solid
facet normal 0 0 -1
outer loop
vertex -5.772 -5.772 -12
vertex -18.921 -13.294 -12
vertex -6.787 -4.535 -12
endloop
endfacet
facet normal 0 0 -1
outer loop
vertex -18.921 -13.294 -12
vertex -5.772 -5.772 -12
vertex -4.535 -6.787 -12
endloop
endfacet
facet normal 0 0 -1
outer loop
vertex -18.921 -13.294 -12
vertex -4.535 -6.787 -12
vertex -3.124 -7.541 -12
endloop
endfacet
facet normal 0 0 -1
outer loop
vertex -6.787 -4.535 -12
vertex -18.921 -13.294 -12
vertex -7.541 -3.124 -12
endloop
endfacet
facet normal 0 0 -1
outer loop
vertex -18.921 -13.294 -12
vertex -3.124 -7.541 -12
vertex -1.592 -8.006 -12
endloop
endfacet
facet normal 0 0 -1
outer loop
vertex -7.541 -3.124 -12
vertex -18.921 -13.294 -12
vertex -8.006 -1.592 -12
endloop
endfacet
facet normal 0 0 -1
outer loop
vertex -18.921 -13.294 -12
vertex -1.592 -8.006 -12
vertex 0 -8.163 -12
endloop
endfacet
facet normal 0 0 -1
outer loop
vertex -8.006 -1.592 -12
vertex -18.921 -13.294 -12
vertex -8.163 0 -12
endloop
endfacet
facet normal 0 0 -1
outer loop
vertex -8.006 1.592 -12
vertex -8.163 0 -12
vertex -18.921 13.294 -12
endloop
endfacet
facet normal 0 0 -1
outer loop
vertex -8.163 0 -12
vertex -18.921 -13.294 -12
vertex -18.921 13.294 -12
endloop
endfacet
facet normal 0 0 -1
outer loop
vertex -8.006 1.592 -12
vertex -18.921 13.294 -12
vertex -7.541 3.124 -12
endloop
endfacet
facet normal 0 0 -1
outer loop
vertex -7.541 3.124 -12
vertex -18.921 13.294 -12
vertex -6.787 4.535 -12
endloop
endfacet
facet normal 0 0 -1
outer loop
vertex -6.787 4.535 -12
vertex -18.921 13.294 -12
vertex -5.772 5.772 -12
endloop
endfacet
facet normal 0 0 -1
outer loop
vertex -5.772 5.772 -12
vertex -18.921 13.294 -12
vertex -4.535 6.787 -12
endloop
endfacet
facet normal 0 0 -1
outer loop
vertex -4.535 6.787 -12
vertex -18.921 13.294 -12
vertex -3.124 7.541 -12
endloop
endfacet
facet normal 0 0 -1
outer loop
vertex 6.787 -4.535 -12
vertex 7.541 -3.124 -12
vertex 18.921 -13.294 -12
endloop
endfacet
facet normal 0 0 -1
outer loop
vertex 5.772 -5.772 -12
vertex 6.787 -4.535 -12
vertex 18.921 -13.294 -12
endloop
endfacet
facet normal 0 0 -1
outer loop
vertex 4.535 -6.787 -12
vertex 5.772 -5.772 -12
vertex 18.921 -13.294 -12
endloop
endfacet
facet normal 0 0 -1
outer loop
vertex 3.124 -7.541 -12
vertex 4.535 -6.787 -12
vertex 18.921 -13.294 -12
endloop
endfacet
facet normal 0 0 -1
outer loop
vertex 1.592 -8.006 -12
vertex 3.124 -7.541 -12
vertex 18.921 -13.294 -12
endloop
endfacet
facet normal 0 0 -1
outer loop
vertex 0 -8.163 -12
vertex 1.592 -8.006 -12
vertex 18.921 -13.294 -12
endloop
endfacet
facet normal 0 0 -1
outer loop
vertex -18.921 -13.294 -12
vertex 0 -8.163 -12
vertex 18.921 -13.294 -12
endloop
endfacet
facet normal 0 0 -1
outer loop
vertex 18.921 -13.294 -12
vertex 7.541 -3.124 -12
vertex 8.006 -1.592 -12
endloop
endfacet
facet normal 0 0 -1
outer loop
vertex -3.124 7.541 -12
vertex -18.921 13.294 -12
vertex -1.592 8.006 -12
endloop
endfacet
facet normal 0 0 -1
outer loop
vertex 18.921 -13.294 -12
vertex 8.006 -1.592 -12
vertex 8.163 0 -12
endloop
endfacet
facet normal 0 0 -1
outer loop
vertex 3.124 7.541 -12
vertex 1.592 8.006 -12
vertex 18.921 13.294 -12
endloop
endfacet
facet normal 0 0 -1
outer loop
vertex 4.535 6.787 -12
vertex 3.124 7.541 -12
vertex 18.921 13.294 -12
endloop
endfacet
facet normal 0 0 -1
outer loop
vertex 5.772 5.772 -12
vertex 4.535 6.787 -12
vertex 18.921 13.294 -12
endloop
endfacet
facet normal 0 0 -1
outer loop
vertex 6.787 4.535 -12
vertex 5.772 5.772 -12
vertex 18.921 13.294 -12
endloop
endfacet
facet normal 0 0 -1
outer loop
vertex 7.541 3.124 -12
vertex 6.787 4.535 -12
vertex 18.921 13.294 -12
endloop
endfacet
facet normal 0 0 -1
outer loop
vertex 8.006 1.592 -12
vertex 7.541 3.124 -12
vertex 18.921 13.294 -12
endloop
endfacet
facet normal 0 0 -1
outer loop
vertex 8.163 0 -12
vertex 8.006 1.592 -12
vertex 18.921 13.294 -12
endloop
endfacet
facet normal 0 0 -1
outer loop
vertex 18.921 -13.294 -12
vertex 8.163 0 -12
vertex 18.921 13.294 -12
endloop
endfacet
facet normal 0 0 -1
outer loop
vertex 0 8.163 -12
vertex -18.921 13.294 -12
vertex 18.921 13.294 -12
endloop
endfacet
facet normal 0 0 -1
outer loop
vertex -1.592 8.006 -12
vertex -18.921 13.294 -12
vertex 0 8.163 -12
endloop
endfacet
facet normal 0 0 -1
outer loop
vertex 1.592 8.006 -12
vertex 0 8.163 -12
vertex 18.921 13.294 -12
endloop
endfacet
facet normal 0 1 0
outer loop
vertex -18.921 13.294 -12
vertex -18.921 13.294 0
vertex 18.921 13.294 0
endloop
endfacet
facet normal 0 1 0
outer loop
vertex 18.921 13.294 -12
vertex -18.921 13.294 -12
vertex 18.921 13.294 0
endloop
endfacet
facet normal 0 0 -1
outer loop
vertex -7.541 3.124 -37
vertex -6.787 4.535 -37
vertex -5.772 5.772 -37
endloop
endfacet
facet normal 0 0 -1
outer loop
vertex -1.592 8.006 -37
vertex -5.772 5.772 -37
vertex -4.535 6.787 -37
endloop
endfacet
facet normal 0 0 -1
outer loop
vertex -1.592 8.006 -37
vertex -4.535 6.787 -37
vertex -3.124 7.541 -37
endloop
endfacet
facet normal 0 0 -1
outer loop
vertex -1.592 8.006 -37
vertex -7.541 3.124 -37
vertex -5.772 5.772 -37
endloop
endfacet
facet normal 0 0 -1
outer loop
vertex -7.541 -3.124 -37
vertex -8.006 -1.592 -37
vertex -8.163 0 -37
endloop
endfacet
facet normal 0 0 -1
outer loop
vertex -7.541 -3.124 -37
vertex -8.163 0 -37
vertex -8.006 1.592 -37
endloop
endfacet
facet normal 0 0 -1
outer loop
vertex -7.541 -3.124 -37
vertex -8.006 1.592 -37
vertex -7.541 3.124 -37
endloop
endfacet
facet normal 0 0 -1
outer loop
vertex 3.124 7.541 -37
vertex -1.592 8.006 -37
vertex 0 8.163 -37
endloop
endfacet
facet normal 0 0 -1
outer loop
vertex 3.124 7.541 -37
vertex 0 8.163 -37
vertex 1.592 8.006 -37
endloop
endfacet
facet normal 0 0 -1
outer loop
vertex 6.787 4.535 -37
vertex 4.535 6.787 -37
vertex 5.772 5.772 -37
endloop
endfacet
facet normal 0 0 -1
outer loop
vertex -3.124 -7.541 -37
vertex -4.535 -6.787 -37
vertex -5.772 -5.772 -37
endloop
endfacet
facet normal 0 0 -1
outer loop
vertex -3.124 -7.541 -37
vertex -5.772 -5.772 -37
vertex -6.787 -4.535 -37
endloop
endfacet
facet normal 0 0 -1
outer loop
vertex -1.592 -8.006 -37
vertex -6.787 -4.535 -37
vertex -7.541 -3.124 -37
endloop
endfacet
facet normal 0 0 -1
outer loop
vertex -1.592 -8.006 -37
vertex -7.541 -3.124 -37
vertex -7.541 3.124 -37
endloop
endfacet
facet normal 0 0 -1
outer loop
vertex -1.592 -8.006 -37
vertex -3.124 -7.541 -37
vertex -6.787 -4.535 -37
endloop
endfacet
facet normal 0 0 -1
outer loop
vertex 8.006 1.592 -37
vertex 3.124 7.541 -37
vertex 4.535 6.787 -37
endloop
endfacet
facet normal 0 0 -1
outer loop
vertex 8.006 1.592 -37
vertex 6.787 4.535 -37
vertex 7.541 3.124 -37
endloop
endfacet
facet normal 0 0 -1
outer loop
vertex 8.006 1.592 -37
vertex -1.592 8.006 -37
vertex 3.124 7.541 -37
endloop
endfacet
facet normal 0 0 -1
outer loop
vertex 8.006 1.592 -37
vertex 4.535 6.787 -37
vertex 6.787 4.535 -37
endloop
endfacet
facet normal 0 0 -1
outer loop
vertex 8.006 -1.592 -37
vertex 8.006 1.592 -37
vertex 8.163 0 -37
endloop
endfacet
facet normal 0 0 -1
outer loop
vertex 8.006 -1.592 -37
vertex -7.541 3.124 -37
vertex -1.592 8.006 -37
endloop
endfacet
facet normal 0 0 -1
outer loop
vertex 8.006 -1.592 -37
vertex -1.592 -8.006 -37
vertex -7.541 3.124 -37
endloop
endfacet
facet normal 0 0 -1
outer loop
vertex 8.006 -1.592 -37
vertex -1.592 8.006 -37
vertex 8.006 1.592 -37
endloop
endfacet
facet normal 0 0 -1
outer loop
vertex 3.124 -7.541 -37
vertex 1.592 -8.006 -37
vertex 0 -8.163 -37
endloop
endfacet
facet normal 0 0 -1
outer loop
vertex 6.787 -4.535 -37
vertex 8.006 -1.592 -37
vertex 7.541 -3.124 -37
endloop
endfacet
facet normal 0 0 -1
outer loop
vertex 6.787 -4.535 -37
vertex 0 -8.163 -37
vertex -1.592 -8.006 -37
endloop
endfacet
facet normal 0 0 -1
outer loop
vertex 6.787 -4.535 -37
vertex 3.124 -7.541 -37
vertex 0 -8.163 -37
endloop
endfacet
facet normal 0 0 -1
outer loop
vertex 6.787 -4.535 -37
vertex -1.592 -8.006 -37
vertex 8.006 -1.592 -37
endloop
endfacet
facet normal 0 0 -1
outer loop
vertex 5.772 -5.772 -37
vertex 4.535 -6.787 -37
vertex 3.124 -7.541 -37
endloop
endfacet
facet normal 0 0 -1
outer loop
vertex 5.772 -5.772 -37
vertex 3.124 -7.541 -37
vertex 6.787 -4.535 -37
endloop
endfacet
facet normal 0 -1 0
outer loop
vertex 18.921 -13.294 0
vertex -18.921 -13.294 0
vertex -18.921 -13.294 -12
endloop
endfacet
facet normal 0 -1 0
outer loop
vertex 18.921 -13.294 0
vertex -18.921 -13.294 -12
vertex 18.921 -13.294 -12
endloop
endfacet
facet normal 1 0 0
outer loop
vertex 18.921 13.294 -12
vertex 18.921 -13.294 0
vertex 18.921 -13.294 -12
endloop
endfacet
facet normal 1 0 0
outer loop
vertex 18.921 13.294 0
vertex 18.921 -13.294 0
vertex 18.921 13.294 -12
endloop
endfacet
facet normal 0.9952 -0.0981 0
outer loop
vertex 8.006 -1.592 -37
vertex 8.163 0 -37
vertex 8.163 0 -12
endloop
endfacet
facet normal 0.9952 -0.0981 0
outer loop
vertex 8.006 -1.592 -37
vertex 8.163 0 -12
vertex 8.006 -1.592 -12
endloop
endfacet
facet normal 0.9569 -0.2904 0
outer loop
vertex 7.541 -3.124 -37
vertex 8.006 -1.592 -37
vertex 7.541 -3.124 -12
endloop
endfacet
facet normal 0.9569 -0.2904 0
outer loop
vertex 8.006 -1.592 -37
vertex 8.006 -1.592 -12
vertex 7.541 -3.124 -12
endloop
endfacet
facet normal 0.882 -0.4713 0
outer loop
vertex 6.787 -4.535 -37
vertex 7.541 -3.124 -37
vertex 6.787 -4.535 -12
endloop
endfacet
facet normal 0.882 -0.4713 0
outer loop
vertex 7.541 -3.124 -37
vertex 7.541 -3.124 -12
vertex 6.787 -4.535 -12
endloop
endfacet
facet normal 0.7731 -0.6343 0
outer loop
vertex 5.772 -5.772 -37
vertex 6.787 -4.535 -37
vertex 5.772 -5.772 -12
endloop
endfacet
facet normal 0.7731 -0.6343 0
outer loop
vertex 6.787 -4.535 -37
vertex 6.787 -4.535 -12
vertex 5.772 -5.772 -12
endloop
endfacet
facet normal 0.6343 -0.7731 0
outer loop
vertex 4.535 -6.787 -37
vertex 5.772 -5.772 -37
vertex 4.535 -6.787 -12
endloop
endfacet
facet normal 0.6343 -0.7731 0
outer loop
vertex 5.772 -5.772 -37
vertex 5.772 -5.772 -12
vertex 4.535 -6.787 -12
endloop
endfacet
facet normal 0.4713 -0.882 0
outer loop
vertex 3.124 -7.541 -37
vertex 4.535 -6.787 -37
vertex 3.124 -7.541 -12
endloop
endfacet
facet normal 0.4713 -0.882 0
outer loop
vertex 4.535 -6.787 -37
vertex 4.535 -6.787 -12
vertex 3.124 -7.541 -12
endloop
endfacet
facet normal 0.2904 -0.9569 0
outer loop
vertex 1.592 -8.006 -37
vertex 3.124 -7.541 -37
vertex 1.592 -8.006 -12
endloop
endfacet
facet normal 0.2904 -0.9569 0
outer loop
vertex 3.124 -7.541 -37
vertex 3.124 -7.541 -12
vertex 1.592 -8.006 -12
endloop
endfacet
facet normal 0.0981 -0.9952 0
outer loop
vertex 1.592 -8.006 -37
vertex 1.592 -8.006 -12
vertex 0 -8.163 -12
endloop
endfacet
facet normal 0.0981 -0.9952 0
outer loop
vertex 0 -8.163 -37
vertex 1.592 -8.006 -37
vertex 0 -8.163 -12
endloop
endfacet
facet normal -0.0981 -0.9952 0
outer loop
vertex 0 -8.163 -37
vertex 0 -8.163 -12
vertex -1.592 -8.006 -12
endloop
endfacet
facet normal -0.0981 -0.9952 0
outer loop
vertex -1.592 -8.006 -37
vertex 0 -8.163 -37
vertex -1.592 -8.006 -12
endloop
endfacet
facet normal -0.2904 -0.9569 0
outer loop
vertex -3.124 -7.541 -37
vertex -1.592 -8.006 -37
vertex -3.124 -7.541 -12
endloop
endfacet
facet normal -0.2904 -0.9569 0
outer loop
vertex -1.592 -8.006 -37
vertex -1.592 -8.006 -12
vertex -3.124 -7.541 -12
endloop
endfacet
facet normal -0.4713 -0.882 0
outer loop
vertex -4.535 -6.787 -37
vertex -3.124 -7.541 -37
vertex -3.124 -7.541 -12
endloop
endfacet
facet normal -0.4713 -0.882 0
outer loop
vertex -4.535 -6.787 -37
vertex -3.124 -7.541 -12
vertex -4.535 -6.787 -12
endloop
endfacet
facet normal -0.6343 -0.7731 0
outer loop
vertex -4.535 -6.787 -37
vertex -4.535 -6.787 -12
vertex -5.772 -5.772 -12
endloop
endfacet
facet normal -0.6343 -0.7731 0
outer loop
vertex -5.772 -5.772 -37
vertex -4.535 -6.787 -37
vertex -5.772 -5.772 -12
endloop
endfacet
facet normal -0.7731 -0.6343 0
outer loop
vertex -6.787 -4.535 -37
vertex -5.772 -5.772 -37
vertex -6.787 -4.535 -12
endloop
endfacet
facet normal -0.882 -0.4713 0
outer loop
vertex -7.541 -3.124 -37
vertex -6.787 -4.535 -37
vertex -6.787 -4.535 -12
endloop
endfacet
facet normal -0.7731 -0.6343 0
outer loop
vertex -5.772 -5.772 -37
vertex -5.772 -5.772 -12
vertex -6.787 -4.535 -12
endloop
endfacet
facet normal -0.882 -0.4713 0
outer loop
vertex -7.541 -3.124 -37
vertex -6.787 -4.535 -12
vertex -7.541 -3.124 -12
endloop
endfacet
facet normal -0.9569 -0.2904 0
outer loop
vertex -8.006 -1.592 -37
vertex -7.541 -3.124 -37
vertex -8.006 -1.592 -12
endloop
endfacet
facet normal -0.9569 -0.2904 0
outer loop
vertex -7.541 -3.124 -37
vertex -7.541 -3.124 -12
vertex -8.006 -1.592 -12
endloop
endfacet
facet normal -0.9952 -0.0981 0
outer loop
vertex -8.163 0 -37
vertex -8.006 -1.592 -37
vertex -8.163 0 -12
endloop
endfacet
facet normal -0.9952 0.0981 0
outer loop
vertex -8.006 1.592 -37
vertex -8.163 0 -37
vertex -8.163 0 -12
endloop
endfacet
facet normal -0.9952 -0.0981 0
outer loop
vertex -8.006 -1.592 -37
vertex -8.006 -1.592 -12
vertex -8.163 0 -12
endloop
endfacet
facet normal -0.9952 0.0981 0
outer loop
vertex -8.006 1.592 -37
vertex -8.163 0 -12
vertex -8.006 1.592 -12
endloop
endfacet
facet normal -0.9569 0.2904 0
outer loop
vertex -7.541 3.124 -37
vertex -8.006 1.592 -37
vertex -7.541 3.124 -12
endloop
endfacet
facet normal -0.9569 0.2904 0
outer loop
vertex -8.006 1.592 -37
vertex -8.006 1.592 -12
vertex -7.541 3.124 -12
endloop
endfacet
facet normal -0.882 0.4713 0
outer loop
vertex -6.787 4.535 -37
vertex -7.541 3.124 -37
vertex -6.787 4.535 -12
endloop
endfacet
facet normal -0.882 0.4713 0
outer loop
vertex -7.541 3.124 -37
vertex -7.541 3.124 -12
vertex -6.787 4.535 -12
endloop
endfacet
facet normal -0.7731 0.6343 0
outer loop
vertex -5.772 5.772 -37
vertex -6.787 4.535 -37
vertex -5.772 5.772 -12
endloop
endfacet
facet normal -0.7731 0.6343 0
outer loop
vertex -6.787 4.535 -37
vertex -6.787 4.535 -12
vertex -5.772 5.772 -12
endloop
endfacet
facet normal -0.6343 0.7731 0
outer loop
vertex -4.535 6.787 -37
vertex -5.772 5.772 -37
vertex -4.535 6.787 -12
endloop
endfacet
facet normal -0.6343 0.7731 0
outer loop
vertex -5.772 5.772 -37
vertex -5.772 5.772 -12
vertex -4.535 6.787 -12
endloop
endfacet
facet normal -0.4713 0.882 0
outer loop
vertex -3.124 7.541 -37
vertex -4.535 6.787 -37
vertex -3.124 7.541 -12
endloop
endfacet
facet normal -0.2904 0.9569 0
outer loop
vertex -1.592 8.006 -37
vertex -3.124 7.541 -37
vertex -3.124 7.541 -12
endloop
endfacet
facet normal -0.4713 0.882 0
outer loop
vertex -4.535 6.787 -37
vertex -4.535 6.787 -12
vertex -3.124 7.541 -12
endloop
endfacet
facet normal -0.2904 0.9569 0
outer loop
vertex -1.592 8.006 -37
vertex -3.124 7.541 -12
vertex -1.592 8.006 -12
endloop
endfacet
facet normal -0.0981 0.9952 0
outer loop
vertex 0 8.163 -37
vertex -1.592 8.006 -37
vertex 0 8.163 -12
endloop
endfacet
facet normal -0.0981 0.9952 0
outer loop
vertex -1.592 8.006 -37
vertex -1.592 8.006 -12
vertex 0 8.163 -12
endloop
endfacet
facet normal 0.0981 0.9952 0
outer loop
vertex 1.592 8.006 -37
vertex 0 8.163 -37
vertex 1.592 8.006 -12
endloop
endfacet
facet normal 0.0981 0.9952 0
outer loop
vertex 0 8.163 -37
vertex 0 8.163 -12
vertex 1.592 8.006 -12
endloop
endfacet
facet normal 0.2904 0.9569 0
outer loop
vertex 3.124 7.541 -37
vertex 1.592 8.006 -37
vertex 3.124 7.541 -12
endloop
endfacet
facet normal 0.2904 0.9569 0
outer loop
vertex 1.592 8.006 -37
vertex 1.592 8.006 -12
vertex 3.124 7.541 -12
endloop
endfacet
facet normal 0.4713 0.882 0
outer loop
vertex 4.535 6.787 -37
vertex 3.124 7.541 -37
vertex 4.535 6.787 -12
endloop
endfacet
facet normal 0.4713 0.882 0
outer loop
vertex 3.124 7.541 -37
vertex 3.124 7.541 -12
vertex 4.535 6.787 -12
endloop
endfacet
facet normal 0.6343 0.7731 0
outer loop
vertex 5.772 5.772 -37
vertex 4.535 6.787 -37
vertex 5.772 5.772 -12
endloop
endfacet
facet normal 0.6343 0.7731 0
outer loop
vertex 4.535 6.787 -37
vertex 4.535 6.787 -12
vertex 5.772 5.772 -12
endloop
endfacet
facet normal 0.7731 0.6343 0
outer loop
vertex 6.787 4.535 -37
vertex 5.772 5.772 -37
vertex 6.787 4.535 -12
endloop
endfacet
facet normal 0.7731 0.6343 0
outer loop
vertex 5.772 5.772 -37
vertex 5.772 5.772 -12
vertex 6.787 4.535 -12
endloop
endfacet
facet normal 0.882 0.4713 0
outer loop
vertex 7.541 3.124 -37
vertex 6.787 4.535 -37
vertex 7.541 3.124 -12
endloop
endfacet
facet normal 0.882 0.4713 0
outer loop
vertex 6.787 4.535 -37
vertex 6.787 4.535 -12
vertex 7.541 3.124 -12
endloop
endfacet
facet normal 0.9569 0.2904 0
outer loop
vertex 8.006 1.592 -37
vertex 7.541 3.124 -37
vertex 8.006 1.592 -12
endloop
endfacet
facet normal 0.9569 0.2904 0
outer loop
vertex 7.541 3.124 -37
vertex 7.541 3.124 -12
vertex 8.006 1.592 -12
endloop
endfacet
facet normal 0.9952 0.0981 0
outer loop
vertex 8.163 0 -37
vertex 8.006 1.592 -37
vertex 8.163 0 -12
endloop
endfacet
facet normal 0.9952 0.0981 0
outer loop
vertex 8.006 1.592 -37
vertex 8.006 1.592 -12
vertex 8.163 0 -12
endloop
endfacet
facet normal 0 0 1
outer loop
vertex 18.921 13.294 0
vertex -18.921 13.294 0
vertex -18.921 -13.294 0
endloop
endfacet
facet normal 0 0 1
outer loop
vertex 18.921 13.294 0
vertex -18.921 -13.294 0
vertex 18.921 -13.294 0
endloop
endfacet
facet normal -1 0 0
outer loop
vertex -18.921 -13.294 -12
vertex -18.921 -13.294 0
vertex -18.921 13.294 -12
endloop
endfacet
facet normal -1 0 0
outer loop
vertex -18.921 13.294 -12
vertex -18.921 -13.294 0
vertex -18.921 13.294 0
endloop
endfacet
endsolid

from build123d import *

# Parameters (mm, degrees)
F0_W     = 37.842602
F0_H     = 26.58715
F1_DEPTH = 12
F2_R     = 8.162544
F3_DEPTH = 25


with BuildPart() as f1:
    # F0 (on Top) → F1 (new body)
    with BuildSketch(Plane.XY):
        Rectangle(F0_W, F0_H)
    extrude(amount=-F1_DEPTH)

    # F2 (on face) → F3 (join)
    with BuildSketch(Plane(origin=(0, 0, -12), x_dir=(1, 0, 0), z_dir=(0, 0, -1))):
        Circle(F2_R)
    extrude(amount=F3_DEPTH)


solid = f1.part
